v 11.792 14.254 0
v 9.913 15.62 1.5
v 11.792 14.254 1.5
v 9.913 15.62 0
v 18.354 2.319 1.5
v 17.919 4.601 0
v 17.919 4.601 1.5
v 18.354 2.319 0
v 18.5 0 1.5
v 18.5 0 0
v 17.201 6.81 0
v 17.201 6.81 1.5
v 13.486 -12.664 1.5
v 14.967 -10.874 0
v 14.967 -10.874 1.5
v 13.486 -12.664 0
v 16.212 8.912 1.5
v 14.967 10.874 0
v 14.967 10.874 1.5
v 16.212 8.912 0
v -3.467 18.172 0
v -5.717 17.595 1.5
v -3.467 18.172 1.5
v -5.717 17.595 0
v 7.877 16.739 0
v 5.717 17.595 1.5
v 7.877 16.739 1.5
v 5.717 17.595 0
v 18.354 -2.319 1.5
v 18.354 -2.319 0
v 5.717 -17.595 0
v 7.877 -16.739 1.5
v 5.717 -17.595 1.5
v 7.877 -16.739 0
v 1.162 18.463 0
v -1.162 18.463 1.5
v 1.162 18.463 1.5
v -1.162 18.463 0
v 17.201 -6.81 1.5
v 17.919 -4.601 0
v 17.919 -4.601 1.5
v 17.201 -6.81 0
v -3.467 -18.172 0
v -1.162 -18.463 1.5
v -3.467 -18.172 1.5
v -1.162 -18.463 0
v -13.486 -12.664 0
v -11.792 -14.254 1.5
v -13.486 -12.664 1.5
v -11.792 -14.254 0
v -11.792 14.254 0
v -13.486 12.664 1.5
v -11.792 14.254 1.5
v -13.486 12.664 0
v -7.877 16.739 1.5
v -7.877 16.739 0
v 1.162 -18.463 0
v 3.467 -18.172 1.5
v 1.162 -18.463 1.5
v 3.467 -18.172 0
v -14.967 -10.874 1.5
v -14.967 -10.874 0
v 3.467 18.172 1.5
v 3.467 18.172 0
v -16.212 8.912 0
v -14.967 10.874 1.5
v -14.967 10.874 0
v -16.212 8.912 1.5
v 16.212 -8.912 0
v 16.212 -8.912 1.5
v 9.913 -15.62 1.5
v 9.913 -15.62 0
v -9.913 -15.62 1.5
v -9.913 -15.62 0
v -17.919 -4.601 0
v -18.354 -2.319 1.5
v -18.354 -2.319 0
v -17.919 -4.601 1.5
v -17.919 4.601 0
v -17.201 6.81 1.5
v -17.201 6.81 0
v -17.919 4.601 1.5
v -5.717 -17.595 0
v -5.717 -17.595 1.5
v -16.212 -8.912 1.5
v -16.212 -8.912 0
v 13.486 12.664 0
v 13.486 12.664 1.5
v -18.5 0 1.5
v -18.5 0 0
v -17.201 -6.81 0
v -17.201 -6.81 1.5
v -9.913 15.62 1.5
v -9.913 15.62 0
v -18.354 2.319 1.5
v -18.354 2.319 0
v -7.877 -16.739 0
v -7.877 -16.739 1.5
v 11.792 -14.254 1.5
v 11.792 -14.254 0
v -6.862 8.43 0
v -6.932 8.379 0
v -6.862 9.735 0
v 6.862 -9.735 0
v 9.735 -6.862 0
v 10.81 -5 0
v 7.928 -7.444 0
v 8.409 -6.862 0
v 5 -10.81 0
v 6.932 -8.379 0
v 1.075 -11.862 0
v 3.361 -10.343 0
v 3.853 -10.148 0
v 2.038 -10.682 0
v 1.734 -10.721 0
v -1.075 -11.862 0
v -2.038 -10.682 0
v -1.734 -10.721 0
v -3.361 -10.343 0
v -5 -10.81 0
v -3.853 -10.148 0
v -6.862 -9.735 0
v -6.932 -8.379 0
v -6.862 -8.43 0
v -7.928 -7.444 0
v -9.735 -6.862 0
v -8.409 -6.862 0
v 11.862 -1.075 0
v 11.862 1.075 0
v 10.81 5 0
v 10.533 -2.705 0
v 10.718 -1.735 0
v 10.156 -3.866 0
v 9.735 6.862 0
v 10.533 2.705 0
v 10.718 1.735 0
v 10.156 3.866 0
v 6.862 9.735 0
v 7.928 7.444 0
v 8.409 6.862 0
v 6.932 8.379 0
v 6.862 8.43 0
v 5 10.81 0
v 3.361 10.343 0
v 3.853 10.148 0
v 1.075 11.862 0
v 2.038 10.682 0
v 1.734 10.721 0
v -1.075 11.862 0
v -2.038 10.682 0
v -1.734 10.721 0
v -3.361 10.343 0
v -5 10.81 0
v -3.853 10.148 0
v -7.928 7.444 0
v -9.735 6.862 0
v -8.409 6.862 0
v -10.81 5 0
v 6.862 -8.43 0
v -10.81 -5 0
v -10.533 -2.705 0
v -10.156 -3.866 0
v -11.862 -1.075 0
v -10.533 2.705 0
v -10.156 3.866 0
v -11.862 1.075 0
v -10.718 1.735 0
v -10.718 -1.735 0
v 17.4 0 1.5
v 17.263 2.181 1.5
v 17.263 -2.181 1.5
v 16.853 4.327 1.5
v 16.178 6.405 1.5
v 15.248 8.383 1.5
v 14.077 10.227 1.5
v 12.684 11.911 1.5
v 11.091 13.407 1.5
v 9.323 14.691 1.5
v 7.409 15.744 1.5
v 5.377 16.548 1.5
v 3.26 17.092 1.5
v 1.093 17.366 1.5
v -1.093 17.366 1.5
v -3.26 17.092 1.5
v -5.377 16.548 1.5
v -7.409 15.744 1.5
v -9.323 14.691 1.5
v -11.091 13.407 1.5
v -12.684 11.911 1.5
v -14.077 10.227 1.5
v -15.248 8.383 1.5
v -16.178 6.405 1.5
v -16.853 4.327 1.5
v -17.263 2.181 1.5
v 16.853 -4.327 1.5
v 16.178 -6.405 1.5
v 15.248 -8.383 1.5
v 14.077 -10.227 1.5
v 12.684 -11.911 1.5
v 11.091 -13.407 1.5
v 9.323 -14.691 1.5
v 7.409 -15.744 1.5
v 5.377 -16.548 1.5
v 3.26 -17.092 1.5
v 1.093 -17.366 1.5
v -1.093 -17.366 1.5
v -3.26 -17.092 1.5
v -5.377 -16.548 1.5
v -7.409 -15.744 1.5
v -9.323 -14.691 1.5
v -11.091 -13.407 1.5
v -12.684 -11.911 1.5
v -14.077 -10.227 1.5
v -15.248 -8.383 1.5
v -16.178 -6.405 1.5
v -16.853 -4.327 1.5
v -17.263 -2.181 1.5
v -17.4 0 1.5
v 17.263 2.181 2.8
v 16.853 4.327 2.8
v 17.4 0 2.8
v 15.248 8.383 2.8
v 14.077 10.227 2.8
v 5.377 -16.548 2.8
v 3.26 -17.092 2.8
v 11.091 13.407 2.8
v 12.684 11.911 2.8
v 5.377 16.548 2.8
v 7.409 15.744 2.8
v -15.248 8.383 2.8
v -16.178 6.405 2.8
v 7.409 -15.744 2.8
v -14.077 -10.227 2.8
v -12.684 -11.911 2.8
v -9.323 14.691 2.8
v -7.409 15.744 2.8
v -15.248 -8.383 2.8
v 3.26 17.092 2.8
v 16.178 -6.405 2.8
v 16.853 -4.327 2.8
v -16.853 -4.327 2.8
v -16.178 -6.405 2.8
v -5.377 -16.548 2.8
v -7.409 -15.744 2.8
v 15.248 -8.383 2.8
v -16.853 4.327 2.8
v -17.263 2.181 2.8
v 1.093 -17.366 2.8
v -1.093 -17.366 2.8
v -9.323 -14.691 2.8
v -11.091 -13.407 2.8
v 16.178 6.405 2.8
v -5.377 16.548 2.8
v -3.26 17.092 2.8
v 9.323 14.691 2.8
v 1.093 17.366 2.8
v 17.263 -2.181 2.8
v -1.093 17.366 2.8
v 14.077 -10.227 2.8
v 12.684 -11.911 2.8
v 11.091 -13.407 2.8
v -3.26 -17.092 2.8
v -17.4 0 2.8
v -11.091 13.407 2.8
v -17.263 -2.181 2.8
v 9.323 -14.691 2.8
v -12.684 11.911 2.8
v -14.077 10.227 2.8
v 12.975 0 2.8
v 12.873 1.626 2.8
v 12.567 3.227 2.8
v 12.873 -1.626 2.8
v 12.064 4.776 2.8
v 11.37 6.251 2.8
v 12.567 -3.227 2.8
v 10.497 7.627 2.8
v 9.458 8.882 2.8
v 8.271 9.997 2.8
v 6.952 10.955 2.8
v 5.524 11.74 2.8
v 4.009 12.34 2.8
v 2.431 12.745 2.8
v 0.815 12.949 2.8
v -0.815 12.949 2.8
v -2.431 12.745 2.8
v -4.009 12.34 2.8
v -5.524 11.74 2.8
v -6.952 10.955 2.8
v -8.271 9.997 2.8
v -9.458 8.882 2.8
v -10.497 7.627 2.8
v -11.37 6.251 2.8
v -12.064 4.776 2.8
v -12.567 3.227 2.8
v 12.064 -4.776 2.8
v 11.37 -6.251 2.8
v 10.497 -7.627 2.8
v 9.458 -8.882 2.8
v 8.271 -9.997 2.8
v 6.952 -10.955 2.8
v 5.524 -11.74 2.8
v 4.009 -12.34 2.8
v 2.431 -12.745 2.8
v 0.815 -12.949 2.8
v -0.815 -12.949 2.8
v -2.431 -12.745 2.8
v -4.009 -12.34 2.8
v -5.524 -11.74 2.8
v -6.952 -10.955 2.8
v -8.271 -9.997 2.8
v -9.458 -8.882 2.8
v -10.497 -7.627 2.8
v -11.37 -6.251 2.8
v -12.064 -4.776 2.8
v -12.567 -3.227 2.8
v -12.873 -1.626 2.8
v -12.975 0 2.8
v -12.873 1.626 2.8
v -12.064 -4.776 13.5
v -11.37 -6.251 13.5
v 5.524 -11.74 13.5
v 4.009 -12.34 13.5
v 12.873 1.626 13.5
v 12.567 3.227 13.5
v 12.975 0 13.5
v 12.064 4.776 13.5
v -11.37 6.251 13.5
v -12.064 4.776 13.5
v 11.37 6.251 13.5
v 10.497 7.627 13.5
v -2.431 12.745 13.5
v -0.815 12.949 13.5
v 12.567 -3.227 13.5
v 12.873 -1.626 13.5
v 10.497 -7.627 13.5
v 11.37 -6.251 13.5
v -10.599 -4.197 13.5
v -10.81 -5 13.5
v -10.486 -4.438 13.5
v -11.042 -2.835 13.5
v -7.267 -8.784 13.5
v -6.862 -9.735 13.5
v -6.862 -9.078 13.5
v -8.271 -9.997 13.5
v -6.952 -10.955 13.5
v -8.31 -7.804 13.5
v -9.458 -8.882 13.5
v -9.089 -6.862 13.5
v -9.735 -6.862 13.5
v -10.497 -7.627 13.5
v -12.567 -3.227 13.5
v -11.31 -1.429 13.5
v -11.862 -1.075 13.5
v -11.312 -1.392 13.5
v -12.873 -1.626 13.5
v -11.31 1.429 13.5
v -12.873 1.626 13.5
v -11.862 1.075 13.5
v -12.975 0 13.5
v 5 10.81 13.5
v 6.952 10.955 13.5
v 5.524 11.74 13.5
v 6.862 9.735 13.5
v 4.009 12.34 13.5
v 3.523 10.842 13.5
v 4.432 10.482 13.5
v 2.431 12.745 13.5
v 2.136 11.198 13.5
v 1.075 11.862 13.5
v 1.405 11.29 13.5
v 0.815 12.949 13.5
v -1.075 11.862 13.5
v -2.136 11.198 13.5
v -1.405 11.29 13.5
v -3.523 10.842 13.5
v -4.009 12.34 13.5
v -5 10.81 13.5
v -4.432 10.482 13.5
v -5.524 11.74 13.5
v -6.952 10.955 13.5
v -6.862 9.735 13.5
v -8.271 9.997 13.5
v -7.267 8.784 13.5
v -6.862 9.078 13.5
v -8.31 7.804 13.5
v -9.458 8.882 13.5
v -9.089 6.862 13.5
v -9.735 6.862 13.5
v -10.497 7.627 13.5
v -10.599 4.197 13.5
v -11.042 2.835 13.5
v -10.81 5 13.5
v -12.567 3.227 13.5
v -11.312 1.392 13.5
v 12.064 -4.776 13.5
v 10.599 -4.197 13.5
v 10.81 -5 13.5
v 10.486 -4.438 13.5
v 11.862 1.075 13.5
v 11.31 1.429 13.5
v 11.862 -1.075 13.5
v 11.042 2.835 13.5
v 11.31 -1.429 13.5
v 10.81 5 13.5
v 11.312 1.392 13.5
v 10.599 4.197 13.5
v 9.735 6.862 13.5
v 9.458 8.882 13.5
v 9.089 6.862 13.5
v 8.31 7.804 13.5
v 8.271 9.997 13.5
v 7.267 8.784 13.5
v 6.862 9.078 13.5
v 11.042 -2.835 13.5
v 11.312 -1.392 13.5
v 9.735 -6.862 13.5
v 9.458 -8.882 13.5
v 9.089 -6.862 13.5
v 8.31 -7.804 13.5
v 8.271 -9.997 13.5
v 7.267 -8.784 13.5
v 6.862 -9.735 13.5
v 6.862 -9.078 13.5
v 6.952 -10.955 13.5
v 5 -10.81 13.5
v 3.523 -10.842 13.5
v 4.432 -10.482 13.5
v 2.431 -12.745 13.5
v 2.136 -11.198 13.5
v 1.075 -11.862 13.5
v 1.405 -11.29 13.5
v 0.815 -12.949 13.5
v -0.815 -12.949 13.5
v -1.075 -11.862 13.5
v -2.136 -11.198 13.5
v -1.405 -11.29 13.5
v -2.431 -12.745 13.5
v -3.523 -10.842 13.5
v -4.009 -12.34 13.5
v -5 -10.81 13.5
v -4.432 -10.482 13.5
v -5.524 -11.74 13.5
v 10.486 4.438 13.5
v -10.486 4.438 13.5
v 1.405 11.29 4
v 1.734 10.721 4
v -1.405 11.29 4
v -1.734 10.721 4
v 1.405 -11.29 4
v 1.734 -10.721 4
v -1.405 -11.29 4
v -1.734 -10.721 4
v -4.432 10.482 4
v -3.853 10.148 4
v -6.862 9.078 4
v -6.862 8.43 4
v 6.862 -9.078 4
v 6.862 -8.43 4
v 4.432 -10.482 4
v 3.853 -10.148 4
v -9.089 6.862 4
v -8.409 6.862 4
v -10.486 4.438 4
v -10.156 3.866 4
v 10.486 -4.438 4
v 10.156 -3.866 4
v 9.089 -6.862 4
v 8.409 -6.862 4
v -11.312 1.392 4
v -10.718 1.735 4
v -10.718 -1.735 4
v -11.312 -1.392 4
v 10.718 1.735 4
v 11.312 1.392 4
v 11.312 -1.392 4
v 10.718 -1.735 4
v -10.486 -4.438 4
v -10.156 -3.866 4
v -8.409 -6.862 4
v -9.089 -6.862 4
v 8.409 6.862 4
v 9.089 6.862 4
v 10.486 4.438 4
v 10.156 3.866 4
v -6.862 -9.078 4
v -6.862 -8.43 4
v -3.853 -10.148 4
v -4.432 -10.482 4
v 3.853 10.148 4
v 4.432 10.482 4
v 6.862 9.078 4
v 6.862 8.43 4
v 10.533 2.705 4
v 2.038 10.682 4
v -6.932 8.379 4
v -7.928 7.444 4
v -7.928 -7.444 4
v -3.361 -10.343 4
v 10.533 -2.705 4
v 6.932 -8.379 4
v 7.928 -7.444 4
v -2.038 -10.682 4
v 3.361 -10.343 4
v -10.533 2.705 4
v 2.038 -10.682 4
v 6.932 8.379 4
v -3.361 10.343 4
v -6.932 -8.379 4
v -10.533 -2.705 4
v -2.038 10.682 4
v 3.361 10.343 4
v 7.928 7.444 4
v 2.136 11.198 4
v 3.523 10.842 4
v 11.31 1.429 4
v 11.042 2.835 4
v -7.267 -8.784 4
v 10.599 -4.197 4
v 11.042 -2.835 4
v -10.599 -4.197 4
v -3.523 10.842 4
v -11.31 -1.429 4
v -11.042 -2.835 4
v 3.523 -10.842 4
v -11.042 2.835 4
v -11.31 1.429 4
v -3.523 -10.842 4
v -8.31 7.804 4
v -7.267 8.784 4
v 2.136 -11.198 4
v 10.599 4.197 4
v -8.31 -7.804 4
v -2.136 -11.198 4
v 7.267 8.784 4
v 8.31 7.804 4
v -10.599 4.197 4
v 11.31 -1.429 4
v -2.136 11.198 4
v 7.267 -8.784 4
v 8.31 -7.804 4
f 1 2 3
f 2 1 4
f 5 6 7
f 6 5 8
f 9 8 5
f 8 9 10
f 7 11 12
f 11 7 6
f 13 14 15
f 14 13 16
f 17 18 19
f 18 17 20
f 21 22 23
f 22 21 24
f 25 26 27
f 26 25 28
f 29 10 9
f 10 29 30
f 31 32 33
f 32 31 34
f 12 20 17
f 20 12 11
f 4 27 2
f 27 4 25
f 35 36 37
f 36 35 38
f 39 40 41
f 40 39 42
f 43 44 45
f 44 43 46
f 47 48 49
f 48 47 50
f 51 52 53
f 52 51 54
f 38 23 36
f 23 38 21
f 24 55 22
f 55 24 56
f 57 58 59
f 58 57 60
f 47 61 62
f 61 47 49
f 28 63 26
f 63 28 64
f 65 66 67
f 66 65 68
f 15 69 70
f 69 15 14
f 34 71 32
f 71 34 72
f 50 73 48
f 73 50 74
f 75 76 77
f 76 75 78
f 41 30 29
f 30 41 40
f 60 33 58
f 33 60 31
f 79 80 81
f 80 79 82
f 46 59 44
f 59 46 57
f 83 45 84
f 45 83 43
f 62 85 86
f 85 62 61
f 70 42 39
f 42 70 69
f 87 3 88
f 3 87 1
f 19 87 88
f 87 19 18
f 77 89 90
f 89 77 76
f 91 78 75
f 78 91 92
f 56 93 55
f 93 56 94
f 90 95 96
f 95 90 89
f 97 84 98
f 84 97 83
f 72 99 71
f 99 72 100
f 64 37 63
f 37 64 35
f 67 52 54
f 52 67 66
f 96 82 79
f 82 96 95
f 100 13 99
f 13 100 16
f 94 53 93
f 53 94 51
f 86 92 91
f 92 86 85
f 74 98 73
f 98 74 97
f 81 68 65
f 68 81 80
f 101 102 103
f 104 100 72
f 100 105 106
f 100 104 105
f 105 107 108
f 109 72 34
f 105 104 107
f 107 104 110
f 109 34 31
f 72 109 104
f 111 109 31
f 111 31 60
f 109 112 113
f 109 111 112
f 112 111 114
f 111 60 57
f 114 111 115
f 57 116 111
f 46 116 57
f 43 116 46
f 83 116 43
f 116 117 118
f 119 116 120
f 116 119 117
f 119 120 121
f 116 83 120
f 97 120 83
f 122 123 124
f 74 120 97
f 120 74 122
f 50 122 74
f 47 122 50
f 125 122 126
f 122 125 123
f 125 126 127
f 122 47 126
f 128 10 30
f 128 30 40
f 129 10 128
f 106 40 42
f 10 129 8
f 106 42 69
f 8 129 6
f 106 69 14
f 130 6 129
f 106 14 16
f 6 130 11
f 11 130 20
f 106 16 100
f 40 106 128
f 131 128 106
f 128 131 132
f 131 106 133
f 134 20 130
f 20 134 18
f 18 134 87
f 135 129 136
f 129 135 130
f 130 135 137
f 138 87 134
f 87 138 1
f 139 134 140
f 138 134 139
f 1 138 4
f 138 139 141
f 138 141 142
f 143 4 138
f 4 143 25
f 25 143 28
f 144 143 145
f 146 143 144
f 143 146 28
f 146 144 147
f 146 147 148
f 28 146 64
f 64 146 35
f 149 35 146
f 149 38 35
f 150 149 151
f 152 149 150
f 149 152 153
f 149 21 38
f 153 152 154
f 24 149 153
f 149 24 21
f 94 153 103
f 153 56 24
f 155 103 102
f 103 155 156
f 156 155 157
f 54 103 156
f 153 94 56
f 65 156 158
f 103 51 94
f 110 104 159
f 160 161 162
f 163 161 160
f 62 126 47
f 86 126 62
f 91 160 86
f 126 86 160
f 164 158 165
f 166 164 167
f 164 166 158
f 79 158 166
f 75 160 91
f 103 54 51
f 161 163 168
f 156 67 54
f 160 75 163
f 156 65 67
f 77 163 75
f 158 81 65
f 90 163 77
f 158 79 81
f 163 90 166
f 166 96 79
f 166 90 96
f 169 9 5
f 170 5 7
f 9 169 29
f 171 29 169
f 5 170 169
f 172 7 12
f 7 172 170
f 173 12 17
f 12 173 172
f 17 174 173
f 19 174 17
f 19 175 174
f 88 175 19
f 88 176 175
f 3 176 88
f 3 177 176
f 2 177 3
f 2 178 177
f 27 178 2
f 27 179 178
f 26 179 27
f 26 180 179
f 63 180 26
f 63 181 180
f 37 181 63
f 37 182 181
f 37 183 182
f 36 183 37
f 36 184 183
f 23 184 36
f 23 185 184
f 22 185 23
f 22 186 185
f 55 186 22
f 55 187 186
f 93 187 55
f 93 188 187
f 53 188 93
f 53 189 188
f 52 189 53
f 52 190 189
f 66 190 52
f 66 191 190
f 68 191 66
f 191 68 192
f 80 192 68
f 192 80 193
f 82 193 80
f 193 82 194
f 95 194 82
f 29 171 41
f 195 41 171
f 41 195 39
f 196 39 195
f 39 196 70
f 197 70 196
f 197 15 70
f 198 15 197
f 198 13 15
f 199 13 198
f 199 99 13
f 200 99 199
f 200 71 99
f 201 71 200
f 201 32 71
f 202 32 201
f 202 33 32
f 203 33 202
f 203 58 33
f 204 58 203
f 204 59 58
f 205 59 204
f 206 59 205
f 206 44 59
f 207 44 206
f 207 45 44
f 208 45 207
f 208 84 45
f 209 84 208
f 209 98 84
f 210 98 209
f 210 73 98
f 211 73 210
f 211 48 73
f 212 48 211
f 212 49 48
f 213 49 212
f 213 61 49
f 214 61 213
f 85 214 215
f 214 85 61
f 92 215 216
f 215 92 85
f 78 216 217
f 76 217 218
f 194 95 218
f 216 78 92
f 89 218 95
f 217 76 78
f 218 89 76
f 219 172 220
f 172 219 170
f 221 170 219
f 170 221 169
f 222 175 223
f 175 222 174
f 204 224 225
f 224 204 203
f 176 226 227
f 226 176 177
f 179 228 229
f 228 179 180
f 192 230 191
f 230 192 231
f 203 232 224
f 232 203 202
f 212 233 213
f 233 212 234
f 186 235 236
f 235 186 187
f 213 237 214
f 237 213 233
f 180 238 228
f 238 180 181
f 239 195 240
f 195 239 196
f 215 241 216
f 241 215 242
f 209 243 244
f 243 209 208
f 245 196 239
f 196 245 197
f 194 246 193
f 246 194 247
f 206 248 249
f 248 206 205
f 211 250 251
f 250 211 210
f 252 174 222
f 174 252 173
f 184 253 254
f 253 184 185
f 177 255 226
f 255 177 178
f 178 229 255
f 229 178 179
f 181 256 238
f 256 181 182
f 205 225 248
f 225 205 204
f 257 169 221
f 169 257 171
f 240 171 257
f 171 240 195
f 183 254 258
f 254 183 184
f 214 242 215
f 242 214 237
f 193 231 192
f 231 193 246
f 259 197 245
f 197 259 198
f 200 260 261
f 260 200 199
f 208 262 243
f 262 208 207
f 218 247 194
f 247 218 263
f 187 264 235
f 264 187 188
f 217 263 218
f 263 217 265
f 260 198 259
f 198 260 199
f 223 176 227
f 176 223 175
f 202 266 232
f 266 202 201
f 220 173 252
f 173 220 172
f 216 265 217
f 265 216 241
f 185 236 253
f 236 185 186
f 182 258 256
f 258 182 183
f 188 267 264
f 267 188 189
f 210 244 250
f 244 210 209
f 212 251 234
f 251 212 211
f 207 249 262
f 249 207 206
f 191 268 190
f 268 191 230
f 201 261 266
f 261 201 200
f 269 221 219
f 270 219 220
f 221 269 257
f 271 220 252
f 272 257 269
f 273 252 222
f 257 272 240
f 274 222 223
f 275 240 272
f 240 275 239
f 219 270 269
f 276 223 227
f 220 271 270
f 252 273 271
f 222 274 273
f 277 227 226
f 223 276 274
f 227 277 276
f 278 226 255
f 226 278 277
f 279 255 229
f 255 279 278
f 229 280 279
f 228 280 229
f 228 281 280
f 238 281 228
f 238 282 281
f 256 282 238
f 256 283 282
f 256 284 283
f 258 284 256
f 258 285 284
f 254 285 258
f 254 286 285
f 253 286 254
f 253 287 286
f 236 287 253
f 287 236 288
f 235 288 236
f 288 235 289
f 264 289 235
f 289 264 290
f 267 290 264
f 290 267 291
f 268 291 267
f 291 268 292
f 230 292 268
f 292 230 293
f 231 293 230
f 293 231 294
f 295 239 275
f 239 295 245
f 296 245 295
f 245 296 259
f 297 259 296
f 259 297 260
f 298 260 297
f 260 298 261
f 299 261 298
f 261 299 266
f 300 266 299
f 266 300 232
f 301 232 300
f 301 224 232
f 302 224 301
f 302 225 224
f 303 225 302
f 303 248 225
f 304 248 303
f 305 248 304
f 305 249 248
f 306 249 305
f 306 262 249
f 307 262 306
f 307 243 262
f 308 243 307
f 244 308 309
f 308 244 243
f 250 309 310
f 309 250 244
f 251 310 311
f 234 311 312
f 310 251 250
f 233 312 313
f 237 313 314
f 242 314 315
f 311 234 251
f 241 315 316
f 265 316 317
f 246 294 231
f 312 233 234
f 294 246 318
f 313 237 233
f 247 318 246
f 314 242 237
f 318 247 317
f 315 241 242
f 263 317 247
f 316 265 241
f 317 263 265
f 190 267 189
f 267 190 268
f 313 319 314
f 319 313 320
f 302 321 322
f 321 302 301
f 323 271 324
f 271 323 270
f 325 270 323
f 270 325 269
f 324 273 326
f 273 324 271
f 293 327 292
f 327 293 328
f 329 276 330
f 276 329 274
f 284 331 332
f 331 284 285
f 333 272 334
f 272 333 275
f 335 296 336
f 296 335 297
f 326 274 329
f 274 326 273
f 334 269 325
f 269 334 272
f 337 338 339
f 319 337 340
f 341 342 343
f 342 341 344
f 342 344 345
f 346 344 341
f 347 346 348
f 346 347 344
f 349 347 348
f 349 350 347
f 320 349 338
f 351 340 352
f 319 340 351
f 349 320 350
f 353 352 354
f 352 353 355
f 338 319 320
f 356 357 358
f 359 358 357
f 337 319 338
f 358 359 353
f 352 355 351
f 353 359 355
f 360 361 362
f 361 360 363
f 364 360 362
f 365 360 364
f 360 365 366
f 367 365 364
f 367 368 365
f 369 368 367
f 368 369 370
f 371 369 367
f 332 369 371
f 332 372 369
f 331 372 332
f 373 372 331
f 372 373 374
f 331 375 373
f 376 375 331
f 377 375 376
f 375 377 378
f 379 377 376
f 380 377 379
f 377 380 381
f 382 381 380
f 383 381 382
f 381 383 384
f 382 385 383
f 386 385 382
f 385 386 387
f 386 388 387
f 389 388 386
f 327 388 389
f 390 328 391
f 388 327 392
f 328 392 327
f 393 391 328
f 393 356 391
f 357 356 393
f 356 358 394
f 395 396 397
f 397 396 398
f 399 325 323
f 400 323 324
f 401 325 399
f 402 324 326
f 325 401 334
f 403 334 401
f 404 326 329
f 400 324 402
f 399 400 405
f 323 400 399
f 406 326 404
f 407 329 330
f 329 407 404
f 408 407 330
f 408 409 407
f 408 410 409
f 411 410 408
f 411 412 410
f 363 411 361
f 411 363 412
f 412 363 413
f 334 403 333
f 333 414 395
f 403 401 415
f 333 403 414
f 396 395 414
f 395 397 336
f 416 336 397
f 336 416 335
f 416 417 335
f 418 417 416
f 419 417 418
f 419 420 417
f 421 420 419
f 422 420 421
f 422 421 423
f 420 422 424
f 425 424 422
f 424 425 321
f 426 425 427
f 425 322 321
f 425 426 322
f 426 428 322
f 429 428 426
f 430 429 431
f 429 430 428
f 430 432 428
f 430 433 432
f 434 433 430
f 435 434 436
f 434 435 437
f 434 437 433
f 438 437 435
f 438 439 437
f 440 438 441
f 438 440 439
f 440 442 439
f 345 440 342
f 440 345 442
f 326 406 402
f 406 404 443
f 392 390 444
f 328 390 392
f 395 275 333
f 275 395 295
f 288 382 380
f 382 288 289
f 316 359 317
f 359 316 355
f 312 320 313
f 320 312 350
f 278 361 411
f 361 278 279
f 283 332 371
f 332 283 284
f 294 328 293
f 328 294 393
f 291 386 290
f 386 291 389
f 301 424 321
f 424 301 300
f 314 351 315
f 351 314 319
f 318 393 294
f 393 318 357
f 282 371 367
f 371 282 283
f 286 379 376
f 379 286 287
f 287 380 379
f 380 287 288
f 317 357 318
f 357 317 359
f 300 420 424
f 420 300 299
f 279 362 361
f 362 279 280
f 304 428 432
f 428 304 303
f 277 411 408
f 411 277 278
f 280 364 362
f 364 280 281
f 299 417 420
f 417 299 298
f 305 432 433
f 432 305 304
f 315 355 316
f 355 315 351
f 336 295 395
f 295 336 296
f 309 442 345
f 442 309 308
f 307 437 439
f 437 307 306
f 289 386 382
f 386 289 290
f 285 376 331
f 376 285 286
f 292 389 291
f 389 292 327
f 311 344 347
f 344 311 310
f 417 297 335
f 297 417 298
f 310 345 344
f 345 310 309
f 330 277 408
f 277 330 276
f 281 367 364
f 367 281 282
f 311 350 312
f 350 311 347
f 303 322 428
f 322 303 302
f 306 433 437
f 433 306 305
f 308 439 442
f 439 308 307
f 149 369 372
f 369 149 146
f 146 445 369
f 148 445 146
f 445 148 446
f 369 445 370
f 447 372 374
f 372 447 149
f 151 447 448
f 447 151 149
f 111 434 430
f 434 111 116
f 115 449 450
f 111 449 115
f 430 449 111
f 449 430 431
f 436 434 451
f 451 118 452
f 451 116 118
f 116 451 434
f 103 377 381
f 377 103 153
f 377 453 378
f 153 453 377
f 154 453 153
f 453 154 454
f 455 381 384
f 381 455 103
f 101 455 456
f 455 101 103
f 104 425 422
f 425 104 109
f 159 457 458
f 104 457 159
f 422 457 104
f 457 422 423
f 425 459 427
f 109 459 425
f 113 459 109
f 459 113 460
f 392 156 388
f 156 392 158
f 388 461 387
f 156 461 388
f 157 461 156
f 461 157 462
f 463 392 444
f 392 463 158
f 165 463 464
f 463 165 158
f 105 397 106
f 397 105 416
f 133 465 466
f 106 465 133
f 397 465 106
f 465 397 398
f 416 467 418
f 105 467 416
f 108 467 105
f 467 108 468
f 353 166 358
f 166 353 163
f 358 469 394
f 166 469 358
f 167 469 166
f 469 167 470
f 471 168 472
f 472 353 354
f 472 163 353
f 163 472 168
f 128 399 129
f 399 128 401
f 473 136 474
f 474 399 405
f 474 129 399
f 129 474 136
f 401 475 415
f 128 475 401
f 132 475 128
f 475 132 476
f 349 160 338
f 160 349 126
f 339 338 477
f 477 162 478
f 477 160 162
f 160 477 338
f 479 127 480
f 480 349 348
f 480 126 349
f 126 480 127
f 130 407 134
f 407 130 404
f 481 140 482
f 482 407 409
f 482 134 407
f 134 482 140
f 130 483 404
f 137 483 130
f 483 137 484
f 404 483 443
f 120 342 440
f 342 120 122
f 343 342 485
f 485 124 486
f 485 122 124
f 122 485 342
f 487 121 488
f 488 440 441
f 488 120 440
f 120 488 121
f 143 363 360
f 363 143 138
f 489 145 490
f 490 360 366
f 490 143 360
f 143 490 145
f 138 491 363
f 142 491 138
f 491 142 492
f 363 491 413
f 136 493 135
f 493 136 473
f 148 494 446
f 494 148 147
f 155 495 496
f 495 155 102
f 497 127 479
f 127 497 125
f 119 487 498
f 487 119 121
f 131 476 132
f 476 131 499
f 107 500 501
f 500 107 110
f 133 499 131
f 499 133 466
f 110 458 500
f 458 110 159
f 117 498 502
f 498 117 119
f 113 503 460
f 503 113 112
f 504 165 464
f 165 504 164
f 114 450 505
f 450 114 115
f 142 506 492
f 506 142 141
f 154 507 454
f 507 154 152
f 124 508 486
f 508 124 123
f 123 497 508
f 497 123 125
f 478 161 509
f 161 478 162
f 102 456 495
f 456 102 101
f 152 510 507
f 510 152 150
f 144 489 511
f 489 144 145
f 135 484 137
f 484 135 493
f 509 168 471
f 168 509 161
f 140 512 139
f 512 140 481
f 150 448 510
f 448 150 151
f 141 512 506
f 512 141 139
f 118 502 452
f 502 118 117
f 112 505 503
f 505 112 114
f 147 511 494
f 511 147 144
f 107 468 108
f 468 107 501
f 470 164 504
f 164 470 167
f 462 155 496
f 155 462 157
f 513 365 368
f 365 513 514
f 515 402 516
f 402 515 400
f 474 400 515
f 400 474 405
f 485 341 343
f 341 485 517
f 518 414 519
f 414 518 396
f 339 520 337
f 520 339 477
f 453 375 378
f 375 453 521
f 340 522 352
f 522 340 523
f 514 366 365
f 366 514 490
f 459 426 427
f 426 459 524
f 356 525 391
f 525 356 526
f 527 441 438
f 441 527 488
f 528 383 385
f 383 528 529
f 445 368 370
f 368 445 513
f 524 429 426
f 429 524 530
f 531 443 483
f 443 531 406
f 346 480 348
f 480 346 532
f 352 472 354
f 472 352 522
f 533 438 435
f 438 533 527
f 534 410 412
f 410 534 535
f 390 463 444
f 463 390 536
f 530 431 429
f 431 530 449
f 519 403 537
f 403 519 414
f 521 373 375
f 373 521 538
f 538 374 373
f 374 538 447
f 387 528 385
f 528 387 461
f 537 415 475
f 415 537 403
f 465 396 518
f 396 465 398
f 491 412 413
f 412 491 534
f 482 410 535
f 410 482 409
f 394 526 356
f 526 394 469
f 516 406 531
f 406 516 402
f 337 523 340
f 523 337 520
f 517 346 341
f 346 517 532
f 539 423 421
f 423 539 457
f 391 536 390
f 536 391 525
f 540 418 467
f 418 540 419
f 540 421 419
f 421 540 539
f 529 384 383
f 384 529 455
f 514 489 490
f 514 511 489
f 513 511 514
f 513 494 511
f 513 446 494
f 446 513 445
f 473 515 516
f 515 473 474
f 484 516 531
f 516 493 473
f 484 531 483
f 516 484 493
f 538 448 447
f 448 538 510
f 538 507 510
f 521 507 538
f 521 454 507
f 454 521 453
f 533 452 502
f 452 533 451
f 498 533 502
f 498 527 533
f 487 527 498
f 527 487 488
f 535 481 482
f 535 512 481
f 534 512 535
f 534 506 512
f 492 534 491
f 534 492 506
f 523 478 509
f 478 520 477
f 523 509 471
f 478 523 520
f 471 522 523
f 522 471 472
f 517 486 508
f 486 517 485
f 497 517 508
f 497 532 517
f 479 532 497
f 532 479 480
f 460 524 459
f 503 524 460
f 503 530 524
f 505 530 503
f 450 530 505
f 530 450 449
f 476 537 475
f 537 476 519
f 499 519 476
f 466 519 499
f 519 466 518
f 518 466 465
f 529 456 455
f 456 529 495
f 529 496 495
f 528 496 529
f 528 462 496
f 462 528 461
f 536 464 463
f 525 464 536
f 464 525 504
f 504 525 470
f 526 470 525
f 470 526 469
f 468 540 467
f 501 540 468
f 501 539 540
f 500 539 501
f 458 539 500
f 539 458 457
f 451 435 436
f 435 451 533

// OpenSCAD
$fn=50;

module hexagonal_cut()
{
	translate([0,10,-0.1]) cylinder(h=14, d=4.3, $fn=6);
	translate([0,-10,-0.1]) cylinder(h=14, d=4.3, $fn=6);
}

difference()
{
	union()
	{
		cylinder(h=1.5, d=37.0);
		cylinder(h=2.8, d=34.8);
		cylinder(h=13.5, d=25.95);
	}
	translate([0,0,-0.01])cylinder(h=14, d=21.75);
	translate([0,0,4])cylinder(h=14, d=22.8);
	hexagonal_cut();
	rotate([0,0,30]) hexagonal_cut();
	rotate([0,0,60]) hexagonal_cut();
	rotate([0,0,90]) hexagonal_cut();
	rotate([0,0,120]) hexagonal_cut();
	rotate([0,0,150]) hexagonal_cut();
}
